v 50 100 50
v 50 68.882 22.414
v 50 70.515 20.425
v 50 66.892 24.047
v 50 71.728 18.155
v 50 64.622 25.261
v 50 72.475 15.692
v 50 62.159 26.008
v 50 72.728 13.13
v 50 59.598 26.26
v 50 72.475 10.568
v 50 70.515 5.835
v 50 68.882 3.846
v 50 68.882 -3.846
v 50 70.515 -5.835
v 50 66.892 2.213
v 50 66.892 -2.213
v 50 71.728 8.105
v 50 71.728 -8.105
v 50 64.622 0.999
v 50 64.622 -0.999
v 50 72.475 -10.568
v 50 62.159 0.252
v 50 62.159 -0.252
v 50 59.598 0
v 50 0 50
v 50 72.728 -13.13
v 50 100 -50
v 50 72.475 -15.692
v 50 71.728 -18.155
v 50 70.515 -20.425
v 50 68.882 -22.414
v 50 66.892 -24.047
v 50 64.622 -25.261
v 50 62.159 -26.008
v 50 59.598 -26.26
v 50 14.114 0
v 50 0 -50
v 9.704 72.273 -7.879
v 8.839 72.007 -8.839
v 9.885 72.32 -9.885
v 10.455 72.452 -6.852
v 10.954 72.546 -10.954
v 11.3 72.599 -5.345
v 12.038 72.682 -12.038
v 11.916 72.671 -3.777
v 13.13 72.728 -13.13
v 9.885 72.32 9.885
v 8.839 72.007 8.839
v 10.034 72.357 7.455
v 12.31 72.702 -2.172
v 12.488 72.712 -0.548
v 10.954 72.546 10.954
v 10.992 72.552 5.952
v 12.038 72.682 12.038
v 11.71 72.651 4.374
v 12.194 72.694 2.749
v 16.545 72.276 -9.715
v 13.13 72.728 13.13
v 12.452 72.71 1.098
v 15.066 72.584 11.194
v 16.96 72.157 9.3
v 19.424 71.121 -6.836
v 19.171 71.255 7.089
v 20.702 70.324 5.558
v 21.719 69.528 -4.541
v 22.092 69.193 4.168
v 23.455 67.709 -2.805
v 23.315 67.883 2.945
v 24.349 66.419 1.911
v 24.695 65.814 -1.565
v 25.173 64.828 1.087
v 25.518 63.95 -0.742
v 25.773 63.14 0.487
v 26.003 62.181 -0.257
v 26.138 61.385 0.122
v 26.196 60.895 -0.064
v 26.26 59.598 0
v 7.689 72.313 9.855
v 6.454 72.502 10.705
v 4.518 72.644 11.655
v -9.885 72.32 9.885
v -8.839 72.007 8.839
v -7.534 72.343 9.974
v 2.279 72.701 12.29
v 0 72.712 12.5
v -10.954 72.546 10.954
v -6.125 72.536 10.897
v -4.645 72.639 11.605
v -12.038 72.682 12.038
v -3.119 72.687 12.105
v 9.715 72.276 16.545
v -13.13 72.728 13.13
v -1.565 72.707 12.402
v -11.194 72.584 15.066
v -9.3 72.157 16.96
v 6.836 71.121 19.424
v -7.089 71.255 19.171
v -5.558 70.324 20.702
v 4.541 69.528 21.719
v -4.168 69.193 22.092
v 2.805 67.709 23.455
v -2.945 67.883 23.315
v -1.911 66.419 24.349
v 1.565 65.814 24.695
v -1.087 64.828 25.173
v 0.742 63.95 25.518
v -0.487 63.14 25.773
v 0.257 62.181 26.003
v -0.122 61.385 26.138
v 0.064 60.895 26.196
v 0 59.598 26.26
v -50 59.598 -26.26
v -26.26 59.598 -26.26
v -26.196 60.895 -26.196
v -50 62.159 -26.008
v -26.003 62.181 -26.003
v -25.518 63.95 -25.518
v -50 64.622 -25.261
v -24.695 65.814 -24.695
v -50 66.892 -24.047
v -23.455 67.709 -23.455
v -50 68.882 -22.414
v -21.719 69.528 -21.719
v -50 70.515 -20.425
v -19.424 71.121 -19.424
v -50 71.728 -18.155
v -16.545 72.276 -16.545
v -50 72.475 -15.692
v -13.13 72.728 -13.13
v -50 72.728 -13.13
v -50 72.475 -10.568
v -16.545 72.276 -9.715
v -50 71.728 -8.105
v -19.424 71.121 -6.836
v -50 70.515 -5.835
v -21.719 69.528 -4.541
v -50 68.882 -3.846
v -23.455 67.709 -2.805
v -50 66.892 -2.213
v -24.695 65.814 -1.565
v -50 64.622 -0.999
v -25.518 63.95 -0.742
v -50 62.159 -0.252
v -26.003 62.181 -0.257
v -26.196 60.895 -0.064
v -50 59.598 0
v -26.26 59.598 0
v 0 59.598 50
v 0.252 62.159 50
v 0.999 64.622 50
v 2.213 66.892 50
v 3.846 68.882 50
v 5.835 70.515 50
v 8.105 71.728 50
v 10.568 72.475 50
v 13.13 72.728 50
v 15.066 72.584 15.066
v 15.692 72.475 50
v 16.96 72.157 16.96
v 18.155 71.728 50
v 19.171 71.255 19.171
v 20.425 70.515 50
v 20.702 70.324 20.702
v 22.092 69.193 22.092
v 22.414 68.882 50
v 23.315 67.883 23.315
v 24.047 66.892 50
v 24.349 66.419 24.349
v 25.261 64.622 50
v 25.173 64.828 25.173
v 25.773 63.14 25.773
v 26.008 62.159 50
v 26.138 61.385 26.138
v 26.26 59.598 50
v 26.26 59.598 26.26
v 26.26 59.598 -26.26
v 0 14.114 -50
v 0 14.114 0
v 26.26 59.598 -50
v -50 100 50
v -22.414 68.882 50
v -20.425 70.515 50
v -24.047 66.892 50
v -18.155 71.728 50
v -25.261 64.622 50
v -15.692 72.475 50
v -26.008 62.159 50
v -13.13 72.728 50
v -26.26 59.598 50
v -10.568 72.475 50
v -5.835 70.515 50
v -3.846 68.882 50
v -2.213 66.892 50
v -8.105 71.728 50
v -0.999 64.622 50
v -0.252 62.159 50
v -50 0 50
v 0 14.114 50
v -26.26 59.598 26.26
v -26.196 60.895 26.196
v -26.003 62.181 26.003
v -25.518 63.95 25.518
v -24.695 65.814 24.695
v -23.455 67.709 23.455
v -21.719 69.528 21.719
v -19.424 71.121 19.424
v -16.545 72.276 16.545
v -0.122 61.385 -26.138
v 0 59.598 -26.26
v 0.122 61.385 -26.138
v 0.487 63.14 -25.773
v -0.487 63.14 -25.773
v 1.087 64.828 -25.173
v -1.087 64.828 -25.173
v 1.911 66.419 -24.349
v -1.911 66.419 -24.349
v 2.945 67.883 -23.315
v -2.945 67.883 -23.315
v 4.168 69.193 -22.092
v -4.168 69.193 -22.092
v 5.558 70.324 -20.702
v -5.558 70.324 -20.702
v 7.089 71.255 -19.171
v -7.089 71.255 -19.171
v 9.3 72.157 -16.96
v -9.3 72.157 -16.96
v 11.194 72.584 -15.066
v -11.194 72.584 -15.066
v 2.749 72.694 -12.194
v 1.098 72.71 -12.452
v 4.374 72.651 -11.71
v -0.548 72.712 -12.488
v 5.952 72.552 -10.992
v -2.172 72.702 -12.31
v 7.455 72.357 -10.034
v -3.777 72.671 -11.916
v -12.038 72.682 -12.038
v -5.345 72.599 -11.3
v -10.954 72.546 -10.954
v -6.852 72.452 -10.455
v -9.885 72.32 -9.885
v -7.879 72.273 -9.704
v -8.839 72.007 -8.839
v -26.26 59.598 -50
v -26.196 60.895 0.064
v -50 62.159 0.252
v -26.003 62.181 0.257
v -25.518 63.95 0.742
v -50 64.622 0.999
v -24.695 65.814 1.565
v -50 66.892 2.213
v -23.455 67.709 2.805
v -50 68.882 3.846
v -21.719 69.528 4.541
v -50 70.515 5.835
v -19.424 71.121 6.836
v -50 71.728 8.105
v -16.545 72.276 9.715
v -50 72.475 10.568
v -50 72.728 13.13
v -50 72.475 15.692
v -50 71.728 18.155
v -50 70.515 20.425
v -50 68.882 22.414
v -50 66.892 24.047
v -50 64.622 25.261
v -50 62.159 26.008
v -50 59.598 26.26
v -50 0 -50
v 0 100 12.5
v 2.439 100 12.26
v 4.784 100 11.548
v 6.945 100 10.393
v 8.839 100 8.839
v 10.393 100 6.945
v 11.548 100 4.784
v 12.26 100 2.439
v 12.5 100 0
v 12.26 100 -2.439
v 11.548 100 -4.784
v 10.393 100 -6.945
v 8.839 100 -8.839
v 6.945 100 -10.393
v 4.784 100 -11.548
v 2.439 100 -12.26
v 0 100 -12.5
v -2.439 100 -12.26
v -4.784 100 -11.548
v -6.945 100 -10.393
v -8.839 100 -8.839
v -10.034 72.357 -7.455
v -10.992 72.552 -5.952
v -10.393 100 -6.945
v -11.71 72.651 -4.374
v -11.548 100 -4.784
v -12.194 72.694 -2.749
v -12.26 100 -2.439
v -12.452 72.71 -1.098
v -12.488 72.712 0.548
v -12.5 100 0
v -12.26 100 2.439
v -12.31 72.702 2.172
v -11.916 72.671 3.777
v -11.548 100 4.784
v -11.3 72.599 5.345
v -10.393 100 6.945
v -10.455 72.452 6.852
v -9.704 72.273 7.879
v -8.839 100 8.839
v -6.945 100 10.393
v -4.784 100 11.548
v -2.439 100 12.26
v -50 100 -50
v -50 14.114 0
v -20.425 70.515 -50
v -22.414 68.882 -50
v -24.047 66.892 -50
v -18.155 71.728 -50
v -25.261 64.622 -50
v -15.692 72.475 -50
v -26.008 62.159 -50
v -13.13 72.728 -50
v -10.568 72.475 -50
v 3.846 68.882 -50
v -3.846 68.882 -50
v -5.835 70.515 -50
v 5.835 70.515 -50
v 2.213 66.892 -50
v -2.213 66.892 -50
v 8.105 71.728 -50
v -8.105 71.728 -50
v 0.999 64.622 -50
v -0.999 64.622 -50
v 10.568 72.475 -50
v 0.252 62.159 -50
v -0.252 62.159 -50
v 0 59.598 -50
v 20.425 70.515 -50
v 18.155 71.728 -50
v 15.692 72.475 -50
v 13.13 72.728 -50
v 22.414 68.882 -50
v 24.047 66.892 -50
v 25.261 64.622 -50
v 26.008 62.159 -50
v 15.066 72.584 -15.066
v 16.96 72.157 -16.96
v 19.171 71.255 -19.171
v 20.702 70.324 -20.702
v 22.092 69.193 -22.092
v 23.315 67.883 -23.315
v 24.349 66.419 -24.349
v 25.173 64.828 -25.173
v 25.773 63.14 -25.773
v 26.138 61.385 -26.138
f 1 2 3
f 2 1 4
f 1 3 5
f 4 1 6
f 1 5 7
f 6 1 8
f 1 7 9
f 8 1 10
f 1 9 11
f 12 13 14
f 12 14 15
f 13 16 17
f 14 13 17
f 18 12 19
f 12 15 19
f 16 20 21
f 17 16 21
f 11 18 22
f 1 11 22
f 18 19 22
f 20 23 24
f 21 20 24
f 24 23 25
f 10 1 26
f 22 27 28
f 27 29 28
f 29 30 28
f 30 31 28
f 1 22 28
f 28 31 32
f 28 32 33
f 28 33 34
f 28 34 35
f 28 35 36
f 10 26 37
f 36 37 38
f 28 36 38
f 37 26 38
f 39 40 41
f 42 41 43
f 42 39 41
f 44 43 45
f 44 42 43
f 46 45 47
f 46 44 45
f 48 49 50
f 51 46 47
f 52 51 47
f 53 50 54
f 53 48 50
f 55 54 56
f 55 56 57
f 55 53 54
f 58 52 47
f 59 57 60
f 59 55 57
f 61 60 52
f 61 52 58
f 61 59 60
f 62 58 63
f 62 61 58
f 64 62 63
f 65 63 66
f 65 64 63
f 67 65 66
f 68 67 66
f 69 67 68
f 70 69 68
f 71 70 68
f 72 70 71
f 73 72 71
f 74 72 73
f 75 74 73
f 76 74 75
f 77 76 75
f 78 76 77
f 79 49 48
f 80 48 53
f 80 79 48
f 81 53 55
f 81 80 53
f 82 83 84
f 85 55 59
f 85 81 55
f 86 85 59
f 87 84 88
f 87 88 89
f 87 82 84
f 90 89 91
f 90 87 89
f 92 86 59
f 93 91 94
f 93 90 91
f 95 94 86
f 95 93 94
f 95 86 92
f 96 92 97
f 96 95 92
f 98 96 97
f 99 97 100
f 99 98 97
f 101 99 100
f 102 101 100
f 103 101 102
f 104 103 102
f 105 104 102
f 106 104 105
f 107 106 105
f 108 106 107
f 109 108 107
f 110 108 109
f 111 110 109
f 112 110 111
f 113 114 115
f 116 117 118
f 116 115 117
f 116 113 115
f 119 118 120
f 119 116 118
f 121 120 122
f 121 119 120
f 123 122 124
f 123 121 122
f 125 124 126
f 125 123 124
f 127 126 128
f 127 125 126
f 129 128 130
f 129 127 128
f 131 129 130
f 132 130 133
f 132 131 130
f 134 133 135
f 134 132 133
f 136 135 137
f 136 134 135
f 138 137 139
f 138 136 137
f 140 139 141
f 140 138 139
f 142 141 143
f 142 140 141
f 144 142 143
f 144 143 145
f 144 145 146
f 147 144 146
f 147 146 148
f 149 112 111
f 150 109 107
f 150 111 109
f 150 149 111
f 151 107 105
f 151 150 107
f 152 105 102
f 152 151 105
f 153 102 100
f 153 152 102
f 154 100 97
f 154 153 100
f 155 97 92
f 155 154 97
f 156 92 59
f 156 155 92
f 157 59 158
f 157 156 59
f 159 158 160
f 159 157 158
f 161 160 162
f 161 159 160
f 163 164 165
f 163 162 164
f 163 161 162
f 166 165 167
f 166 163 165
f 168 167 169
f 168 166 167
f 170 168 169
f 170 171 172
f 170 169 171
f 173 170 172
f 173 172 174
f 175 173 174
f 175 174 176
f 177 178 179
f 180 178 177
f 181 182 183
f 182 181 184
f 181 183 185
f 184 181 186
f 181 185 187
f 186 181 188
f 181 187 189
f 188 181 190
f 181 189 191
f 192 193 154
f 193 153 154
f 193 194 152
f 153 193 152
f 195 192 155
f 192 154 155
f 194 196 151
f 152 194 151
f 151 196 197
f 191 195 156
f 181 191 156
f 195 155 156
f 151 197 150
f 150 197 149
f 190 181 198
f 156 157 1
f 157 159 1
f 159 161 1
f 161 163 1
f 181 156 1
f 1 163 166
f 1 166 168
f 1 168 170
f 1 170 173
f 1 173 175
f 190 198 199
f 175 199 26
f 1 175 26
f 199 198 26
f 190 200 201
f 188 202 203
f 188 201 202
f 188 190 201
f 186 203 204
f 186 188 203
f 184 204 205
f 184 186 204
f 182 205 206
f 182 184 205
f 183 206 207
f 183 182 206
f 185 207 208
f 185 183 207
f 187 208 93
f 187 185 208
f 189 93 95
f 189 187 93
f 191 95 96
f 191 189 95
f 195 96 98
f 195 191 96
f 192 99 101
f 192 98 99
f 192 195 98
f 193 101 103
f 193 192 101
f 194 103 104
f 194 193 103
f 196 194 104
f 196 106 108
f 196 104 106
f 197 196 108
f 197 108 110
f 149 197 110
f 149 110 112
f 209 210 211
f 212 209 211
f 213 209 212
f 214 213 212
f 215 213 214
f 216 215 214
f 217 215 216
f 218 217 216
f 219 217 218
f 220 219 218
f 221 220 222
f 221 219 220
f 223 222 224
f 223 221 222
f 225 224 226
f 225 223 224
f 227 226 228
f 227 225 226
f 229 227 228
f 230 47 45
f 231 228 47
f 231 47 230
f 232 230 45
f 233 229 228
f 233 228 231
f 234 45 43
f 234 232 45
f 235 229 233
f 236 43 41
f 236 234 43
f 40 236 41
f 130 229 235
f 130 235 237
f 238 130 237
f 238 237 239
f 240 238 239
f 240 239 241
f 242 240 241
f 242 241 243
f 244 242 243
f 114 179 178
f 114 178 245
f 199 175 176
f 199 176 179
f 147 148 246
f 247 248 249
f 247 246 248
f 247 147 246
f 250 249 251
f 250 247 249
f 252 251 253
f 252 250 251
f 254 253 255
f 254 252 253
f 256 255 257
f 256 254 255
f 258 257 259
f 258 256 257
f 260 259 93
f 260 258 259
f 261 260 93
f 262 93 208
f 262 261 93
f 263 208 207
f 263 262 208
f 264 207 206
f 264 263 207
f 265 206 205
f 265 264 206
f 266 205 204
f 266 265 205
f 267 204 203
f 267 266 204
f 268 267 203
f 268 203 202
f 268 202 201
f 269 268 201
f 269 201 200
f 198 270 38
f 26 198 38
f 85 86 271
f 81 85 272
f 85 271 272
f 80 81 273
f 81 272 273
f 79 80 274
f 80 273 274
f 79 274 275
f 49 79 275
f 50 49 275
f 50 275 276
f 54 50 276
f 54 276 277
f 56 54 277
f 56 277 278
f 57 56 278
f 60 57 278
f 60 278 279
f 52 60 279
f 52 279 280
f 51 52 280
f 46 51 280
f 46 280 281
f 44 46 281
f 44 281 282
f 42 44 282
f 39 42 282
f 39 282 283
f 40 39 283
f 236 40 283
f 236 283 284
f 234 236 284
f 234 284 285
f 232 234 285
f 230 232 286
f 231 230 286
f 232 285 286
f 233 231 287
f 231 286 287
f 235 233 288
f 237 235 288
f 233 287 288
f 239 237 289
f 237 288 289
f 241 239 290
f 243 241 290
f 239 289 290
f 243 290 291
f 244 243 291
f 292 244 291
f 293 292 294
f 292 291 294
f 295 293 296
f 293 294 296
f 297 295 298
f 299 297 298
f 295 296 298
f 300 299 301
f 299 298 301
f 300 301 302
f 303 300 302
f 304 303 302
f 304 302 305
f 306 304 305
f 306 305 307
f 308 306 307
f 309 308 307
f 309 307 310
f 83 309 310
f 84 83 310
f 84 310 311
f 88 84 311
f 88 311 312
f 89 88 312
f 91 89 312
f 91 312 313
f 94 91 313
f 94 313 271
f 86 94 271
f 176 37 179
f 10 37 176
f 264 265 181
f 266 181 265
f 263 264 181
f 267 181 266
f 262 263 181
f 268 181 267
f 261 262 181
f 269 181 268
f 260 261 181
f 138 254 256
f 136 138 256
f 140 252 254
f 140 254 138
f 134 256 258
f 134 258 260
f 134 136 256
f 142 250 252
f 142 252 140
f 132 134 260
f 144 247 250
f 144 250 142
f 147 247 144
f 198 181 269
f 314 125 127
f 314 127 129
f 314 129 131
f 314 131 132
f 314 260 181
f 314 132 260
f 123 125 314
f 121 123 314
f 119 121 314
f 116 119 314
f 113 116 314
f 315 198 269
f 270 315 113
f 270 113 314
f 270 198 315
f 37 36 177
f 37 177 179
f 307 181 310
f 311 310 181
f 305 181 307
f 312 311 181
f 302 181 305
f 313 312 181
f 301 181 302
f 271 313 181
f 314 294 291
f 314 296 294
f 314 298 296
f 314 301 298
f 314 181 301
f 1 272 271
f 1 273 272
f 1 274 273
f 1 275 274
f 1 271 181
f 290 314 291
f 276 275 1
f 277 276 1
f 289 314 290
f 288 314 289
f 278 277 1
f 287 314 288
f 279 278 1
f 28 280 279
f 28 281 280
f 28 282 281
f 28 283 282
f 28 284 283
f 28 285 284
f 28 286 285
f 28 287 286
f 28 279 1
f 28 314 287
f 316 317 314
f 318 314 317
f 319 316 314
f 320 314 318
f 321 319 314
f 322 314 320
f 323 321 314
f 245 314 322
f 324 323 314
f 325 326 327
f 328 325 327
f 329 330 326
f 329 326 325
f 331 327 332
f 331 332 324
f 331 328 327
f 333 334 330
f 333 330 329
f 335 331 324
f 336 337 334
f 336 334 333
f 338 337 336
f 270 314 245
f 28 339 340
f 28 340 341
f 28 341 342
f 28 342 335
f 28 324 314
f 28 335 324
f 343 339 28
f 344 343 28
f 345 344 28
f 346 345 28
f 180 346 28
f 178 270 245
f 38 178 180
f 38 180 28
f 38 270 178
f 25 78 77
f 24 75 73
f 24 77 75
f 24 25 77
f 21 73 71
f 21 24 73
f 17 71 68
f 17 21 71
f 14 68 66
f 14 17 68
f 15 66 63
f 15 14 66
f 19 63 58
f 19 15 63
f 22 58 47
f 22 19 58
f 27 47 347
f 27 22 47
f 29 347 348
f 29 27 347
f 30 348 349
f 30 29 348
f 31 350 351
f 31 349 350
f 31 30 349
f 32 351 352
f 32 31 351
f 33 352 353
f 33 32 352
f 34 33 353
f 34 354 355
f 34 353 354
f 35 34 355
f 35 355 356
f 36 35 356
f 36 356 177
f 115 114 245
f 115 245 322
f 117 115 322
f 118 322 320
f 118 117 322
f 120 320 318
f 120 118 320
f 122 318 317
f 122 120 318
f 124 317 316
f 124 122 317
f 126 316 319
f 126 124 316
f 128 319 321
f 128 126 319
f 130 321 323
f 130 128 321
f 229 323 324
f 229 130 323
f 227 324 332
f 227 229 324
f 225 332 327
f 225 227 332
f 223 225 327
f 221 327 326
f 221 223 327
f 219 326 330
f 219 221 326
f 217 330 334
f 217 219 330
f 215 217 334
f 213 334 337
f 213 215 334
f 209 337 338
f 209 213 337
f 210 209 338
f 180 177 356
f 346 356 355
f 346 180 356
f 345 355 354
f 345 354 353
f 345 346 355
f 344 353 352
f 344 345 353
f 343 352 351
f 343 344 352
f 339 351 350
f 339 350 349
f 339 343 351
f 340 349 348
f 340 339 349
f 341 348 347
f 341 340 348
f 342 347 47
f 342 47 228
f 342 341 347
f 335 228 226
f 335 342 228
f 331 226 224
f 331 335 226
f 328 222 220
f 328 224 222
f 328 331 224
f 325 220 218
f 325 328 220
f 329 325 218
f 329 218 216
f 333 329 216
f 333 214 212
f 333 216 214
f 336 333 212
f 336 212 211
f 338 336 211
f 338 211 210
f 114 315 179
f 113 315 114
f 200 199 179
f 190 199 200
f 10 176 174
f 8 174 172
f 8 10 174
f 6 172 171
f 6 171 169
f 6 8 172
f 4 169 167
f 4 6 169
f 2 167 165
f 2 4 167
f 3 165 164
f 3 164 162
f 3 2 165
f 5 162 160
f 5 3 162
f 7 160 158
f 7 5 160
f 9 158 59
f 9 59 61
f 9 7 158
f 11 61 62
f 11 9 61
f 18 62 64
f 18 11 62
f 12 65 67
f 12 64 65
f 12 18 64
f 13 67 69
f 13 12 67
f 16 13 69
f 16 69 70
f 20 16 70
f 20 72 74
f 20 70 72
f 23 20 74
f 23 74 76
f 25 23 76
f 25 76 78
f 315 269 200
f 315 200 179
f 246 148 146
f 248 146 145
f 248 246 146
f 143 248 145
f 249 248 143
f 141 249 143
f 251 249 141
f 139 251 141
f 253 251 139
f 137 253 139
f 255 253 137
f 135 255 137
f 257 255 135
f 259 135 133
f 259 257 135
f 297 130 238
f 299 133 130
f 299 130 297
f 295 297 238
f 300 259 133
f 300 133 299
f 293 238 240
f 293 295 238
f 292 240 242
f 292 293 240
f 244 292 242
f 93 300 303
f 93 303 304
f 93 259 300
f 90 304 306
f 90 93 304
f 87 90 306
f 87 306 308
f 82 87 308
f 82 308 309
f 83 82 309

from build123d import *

# Parameters (mm, degrees)
SKETCH1_W           = 100
SKETCH1_H           = 100
BOSS_EXTRUDE1_DEPTH = 100
CUT_EXTRUDE1_DEPTH  = 50
CIRPATTERN1_COUNT   = 4
SKETCH3_R           = 12.5
CUT_EXTRUDE2_DEPTH  = 50


with BuildPart() as part:
    # Sketch1 → Boss-Extrude1 (new body)
    with BuildSketch(Plane(origin=(0, 0, 0), x_dir=(1, 0, 0), z_dir=(0, 1, 0))):
        Rectangle(SKETCH1_W, SKETCH1_H)
    extrude(amount=BOSS_EXTRUDE1_DEPTH)

    # Sketch2 → Cut-Extrude1 (cut)
    with BuildSketch(Plane.XY.offset(50)):
        with BuildLine():
            Line((0, 14.113800065), (-26.260063577, 59.59756439))
            ThreePointArc((-26.260063577, 59.59756439), (-13.130031788, 72.727596179), (0, 59.59756439))
            ThreePointArc((0, 59.59756439), (13.130031788, 72.727596179), (26.260063577, 59.59756439))
            Line((26.260063577, 59.59756439), (0, 14.113800065))
        make_face()
    cut_extrude1 = extrude(amount=-CUT_EXTRUDE1_DEPTH, mode=Mode.SUBTRACT)

    # CirPattern1: Cut-Extrude1 ×4 about axis
    cirpattern1_axis = Axis((0, -5, 0), (0, 1, 0))
    for i in range(1, CIRPATTERN1_COUNT):
        add(cut_extrude1.rotate(cirpattern1_axis, i * 360 / CIRPATTERN1_COUNT), mode=Mode.SUBTRACT)

    # Sketch3 → Cut-Extrude2 (cut)
    with BuildSketch(Plane(origin=(0, 100, 0), x_dir=(1, 0, 0), z_dir=(0, 1, 0))):
        Circle(SKETCH3_R)
    extrude(amount=-CUT_EXTRUDE2_DEPTH, mode=Mode.SUBTRACT)


solid = part.part
